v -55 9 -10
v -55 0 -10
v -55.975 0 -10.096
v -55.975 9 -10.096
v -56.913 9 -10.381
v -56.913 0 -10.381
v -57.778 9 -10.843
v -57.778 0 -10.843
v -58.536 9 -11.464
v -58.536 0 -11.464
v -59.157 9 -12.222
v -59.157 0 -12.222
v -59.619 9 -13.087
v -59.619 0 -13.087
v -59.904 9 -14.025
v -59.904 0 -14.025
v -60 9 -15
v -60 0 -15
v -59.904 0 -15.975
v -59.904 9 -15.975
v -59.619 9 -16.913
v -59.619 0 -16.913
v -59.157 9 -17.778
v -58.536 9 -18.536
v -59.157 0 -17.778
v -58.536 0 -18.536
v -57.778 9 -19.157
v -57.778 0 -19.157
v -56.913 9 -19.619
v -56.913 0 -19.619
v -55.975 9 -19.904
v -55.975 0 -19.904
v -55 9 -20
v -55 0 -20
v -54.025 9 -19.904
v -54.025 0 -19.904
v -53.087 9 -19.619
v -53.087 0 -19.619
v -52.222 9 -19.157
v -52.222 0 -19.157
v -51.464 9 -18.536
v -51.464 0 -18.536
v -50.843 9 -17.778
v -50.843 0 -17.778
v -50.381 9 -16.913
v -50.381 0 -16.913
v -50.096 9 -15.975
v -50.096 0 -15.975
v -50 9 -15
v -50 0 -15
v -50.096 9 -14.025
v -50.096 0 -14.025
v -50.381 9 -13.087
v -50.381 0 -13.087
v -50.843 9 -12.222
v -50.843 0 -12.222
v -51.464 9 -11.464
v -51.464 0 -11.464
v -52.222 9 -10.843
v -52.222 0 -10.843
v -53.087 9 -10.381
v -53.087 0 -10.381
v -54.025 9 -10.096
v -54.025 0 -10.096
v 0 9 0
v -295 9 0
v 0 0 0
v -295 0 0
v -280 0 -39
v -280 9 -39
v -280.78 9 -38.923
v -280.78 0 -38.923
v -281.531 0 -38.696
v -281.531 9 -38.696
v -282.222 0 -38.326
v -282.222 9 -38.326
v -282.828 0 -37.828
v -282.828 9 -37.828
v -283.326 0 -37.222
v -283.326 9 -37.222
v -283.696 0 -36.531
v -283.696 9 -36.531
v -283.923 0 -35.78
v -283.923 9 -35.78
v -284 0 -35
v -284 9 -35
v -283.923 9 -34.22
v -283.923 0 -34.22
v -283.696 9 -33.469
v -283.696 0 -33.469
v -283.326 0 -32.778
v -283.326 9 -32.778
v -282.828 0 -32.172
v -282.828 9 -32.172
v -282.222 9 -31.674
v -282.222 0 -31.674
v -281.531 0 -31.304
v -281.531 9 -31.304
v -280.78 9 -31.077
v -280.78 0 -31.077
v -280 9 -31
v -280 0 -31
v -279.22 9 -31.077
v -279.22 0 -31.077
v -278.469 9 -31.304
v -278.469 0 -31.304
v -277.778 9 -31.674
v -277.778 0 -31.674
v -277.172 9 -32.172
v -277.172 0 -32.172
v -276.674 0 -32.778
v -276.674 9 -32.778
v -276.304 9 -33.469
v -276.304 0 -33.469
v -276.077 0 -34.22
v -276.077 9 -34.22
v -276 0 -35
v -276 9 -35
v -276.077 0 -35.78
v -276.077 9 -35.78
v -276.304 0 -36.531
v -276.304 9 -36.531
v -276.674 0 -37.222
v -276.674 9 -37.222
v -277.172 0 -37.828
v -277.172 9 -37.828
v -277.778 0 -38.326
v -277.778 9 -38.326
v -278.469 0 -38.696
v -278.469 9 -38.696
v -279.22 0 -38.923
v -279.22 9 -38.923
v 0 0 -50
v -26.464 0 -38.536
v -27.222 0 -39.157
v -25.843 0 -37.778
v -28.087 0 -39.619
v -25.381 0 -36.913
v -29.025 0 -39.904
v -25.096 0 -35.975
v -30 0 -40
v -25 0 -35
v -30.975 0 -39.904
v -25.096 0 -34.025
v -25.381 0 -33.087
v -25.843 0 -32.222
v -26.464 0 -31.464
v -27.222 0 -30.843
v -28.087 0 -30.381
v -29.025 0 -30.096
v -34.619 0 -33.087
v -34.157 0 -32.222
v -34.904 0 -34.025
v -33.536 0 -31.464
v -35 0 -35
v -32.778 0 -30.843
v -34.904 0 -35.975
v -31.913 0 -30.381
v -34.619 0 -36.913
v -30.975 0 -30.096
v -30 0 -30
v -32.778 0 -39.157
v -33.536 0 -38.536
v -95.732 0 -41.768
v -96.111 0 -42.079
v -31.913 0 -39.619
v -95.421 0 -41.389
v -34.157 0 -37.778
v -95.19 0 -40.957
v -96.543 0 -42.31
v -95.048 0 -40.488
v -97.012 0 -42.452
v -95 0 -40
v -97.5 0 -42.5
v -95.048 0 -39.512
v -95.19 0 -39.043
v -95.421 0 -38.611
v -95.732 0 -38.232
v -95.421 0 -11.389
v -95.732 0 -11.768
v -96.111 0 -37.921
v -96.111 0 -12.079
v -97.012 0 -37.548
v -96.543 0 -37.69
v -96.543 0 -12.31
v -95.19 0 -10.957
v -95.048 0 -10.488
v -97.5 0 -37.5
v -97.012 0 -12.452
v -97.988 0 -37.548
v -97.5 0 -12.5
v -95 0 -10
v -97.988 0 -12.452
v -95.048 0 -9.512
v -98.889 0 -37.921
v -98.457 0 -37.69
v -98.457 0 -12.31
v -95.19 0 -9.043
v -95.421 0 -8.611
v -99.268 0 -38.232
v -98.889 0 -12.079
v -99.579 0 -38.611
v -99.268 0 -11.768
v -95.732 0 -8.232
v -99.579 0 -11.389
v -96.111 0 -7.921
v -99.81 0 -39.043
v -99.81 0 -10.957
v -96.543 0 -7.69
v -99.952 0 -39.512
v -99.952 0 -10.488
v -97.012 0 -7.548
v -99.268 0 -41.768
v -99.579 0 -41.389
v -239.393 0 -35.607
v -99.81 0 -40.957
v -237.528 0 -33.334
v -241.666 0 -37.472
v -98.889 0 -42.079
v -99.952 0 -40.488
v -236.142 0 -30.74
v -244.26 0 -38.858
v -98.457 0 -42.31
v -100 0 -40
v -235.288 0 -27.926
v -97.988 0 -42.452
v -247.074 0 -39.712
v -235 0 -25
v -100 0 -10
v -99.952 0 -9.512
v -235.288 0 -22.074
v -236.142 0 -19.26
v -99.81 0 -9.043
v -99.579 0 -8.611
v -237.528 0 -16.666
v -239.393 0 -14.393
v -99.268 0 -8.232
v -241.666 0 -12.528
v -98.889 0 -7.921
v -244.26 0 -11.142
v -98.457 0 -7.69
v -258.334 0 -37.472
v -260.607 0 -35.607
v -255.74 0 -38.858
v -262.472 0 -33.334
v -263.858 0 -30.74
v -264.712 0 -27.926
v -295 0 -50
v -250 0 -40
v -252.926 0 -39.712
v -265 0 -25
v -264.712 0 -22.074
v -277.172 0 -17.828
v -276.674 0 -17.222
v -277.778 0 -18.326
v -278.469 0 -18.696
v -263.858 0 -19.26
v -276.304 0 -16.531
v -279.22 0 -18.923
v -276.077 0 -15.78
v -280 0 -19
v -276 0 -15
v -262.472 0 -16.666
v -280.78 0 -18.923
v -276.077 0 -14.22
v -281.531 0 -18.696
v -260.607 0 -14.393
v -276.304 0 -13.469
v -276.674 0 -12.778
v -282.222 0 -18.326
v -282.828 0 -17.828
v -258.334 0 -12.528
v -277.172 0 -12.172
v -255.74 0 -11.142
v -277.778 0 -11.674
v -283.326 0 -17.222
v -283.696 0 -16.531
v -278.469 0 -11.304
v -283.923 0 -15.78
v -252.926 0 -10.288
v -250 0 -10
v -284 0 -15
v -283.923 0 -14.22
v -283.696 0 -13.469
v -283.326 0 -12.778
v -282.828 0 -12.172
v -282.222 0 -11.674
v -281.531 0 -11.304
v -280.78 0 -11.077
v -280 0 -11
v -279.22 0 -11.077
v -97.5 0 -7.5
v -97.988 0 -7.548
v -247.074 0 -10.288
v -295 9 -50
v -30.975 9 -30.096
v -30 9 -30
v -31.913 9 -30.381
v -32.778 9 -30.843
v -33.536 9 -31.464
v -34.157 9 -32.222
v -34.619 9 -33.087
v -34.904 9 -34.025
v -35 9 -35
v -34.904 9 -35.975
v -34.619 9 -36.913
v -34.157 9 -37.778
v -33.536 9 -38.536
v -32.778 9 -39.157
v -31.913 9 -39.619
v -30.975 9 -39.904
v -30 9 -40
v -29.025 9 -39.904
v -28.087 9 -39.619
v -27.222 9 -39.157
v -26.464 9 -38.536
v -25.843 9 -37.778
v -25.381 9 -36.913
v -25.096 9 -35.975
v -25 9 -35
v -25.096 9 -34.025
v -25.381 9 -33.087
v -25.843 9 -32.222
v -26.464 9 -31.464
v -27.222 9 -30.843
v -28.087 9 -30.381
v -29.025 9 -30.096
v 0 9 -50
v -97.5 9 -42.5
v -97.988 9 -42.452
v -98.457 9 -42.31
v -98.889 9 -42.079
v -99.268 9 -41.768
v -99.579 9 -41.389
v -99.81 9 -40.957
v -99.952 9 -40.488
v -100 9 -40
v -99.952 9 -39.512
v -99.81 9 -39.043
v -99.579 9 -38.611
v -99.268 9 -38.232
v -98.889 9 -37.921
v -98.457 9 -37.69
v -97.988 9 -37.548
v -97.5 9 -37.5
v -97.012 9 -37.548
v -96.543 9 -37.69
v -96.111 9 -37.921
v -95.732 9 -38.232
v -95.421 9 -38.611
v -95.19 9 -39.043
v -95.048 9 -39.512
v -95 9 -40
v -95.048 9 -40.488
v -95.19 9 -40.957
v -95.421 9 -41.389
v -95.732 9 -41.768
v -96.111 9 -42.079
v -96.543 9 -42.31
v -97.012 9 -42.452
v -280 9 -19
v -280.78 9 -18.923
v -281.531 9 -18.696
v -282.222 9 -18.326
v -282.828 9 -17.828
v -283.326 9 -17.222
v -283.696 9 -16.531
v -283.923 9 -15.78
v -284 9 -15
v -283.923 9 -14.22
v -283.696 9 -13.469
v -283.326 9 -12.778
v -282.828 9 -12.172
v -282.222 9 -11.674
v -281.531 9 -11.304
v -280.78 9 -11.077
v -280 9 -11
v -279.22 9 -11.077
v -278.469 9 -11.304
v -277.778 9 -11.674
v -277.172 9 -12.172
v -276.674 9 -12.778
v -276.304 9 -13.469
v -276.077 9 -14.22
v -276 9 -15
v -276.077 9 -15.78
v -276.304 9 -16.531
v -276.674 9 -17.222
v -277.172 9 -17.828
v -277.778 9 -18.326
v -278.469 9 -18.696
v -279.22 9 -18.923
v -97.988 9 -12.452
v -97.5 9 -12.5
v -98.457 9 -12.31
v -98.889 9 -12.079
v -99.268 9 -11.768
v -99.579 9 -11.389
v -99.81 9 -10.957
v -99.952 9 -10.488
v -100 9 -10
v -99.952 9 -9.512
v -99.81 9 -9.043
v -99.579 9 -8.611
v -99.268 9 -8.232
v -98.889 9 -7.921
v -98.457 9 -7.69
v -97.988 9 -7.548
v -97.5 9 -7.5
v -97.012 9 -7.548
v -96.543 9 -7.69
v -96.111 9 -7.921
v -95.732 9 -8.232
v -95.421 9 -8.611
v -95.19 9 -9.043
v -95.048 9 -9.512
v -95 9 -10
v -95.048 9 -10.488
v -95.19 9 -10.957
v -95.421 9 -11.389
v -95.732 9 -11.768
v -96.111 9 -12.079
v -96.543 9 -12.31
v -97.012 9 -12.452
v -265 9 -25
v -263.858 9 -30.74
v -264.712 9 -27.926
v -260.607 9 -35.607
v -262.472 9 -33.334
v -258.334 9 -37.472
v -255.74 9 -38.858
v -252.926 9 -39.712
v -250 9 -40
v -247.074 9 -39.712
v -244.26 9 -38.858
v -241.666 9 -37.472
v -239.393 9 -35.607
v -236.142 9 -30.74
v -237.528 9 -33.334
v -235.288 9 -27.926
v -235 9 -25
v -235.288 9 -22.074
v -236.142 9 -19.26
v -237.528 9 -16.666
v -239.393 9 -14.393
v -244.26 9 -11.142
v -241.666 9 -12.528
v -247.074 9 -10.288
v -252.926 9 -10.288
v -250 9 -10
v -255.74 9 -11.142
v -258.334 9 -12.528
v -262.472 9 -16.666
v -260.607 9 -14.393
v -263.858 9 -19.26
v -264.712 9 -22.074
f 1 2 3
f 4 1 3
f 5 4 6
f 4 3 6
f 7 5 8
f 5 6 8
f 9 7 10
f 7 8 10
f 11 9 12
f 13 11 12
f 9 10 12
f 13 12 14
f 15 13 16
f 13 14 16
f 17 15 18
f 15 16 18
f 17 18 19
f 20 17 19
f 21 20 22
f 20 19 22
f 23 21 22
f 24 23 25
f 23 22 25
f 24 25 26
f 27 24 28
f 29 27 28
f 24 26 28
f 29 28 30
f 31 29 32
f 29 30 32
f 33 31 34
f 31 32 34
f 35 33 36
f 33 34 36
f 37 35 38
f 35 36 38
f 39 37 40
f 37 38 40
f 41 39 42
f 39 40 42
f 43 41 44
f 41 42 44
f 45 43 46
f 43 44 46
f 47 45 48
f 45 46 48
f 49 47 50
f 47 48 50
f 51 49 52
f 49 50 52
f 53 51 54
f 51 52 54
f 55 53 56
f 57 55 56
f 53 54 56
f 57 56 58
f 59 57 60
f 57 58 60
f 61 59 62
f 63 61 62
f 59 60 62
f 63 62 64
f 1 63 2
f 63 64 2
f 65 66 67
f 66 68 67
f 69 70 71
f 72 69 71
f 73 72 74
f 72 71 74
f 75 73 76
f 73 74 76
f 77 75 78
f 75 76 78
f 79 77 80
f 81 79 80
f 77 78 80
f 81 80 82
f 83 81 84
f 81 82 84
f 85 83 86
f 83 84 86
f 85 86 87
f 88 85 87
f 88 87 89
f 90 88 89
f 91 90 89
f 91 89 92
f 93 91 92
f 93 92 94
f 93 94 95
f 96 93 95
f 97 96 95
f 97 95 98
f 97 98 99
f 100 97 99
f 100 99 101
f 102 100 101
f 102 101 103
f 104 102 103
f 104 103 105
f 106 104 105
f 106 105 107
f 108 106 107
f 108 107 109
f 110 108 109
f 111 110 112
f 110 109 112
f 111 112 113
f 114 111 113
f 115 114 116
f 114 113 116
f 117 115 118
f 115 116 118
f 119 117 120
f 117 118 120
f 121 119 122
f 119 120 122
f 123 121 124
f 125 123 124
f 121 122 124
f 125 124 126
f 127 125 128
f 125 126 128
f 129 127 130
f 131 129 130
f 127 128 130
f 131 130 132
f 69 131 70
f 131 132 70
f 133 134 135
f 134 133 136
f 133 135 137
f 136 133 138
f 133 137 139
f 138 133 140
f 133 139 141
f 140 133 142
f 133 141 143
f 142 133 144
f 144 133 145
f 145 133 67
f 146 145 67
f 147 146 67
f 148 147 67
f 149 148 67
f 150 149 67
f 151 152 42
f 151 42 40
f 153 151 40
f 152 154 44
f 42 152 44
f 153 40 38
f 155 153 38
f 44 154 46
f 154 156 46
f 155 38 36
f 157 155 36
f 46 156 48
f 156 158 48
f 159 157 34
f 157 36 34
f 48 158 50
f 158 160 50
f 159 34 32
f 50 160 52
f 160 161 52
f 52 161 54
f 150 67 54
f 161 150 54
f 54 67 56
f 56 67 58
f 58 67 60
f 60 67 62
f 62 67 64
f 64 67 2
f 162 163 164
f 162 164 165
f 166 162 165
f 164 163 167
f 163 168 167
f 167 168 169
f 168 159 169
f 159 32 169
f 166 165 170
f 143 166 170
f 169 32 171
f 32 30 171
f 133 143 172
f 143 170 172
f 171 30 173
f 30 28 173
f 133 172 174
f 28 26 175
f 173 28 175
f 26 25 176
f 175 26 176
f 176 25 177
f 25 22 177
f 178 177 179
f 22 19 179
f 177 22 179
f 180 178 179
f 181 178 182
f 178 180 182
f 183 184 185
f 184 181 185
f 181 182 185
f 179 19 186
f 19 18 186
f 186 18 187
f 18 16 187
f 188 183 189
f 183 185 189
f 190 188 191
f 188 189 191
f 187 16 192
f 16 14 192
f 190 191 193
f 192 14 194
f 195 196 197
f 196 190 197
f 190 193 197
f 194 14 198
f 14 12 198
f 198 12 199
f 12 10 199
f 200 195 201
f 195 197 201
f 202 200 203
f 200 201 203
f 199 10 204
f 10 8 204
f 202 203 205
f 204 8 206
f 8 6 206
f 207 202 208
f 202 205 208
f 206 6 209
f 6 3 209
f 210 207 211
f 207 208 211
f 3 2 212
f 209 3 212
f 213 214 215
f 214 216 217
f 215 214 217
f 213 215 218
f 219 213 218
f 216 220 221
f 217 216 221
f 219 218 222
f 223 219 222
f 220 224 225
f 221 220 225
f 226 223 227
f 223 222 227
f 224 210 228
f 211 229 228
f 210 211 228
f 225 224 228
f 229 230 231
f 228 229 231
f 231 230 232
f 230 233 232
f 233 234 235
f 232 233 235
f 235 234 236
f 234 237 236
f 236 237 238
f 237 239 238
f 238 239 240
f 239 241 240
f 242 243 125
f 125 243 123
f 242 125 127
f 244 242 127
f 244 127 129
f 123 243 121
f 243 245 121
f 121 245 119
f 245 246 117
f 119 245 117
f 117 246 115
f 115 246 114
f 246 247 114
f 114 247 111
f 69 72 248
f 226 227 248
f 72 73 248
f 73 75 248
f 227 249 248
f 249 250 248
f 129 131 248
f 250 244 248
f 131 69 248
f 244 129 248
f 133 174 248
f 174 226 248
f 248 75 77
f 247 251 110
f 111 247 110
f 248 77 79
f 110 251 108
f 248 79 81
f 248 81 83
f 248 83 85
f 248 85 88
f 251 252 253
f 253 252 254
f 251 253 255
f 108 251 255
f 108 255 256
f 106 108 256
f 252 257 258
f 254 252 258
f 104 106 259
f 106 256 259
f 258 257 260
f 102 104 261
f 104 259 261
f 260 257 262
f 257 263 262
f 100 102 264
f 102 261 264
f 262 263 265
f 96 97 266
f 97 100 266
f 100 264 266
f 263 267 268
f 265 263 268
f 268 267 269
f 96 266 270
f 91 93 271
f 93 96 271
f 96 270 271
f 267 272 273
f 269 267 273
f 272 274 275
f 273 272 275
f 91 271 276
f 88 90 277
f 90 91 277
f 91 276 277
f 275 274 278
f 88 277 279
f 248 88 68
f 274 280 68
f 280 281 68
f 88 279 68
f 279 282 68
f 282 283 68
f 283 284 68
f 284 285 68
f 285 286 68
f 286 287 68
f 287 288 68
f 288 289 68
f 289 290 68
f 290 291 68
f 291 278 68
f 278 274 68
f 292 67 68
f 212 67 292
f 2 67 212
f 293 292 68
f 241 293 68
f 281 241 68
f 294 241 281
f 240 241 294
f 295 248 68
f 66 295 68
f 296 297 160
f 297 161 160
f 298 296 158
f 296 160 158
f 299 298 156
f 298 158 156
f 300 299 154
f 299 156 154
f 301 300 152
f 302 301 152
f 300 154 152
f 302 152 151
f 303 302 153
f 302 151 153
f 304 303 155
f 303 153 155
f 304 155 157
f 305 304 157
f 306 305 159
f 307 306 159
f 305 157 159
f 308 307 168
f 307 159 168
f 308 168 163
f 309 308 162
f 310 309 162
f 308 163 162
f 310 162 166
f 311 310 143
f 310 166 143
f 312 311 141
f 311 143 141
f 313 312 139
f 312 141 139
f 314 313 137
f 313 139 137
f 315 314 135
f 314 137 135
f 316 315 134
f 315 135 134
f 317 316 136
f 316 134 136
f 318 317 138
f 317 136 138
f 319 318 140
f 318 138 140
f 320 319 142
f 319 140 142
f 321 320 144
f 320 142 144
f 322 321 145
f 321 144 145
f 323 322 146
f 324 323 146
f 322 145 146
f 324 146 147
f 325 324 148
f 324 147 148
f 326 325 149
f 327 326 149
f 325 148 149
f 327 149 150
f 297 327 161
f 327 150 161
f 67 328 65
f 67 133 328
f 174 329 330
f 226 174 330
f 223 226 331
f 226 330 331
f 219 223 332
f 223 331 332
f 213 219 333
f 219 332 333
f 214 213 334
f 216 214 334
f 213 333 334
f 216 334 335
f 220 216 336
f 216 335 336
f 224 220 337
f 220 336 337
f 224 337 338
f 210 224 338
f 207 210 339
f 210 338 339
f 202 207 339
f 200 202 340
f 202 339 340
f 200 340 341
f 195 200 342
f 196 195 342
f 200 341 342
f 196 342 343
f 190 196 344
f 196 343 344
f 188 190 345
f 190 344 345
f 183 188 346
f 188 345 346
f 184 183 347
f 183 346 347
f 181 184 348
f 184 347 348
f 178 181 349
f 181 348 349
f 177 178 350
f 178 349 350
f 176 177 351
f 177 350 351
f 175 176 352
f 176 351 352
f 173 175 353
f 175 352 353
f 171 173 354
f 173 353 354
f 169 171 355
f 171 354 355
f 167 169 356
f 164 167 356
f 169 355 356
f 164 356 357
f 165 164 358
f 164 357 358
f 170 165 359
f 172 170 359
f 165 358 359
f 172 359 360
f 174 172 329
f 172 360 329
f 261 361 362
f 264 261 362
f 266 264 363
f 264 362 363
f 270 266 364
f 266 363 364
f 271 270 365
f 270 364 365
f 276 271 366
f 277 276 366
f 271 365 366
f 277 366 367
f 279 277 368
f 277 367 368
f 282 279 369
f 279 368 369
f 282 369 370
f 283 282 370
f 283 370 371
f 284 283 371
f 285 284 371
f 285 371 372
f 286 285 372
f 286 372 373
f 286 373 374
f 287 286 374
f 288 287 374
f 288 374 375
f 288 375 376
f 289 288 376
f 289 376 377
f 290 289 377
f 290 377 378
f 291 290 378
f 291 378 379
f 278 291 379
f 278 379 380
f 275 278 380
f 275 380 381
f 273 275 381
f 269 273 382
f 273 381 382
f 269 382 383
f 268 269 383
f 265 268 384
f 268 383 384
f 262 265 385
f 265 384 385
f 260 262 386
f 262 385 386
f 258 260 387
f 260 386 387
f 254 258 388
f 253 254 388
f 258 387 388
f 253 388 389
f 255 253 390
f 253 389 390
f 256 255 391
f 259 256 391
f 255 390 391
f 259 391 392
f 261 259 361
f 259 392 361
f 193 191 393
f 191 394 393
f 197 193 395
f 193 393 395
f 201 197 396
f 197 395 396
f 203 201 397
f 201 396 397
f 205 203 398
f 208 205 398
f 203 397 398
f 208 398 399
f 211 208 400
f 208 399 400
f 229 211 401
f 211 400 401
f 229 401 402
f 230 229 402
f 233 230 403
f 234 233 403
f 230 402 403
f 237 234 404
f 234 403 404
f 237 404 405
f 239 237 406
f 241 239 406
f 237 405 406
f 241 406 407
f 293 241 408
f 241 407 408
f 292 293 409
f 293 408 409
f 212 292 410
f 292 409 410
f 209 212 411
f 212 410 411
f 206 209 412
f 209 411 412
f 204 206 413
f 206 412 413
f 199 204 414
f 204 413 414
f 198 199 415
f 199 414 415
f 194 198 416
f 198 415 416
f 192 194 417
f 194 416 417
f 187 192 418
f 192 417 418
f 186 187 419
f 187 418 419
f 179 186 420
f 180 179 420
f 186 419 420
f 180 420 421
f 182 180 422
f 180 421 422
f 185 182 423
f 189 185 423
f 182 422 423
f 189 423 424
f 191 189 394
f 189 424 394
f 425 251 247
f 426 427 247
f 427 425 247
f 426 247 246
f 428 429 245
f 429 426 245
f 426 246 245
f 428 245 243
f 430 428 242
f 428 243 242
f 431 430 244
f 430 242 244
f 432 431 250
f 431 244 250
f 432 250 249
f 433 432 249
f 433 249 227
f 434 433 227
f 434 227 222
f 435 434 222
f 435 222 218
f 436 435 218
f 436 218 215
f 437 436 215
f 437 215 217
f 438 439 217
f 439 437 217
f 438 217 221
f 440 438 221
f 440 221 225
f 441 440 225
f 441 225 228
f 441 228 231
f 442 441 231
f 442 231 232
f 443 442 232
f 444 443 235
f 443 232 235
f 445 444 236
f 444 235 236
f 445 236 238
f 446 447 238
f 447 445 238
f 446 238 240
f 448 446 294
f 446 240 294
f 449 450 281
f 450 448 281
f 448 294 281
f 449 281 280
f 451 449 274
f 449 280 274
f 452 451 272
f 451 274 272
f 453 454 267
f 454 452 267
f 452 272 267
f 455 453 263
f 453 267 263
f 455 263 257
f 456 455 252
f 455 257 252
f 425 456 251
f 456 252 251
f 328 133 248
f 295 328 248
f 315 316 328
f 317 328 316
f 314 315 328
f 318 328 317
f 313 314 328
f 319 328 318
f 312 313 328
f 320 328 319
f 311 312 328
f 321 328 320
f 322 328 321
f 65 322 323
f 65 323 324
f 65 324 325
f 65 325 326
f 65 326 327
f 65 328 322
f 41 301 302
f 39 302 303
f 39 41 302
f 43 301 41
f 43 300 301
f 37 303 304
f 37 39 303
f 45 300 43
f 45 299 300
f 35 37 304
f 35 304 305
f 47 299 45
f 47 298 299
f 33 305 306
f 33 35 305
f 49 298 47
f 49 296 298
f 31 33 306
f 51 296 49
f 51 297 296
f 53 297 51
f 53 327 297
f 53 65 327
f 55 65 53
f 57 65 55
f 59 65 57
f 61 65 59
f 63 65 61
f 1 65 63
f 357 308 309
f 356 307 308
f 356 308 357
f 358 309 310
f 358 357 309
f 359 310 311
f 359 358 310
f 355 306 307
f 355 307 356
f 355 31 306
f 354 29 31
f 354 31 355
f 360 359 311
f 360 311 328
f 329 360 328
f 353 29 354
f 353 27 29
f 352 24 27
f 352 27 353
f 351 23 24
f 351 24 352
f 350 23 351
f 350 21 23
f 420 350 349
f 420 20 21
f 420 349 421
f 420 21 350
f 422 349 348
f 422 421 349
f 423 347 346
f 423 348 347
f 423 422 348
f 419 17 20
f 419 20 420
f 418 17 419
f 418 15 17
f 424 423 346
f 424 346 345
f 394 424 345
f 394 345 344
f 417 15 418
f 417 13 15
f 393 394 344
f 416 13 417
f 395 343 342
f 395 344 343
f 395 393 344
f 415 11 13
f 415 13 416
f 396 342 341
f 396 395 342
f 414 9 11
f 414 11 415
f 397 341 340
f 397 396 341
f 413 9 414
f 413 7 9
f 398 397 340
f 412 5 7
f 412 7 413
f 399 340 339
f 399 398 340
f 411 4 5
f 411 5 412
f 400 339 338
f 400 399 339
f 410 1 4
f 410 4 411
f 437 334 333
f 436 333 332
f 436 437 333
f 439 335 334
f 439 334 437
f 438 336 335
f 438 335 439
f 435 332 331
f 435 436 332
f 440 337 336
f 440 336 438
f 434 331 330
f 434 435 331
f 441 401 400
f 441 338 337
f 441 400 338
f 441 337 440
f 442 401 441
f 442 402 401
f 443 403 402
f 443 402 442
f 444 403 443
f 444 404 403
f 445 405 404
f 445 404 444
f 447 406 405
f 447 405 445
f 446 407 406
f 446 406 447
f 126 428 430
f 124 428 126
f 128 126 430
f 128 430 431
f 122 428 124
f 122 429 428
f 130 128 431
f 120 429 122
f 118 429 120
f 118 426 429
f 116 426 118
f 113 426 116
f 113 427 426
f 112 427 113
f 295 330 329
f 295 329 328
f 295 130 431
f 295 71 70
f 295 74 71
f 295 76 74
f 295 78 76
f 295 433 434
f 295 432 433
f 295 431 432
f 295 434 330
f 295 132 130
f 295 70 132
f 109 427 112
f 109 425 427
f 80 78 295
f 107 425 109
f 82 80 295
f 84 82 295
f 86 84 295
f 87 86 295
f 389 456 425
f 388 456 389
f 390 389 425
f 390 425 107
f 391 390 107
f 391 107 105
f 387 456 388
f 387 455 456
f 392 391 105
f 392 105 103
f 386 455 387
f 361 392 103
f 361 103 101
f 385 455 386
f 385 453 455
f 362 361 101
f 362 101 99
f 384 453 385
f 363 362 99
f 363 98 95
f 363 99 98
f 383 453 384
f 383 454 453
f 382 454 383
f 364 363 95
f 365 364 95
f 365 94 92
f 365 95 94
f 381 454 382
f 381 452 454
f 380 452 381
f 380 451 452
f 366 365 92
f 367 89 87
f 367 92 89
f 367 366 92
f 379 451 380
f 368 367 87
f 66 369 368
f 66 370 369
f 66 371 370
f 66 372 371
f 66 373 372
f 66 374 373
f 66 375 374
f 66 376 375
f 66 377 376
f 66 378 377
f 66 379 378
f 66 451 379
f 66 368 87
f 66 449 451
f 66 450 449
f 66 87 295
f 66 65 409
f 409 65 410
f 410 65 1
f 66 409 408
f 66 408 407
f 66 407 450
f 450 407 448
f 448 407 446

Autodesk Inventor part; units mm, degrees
ref_plane "YZ Plane" through (0, 0, 0) normal (1, 0, 0) x (0, 1, 0)
ref_plane "XZ Plane" through (0, 0, 0) normal (0, 1, 0) x (-1, 0, 0)
ref_plane "XY Plane" through (0, 0, 0) normal (0, 0, 1) x (1, 0, 0)
sketch "Skizze1" plane through (0, 0, 0) normal (0, 1, 0) x (-1, 0, 0)
  line L0 (0, 0) -> (275, 0)
  line L1 (275, 0) -> (275, -50)
  line L2 (275, -50) -> (0, -50)
  line L3 (0, -50) -> (0, 0)
  line L4 (275, 0) -> (275, -25)
  line L5 (275, -25) -> (250, -25)
  circle A0 centre (250, -25) radius 15
  line L6 (275, -50) -> (295, -50)
  line L7 (295, -50) -> (295, 0)
  line L8 (295, 0) -> (275, 0)
  dimension "d0" = 275
  dimension "d1" = 50
  dimension "d2" = 25
  dimension "d3" = 30
  dimension "d18" = 20
extrude "Extrusion1" add sketch "Skizze1" along normal blind 9 contours L0 L1 L2 L3
sketch "Skizze2" plane through (0, 9, 0) normal (0, 1, 0) x (1, 0, 0)
  line L0 (0, 0) -> (0, 50) projected
  line L1 (0, 50) -> (-30, 50)
  line L2 (-30, 50) -> (-30, 35)
  line L3 (0, 0) -> (-55, 0)
  line L4 (-275, 0) -> (0, 0) projected
  line L5 (-55, 0) -> (-70, 0)
  line L6 (-70, 0) -> (-55, 0)
  line L7 (-55, 0) -> (-55, 15)
  dimension "d6" = 30
  dimension "d7" = 15
  dimension "d8" = 55
  dimension "d9" = 15
  dimension "d10" = 15
hole "Bohrung1" at (-55, 9, -15) at (-30, 9, -35) direction (0, -1, 0) diameter 10 depth 10 tip angle 118
extrude "Extrusion2" add sketch "Skizze1" along normal blind 9 contours L8 L7 L6 L1
sketch "Skizze3" plane through (0, 0, 0) normal (0, -1, 0) x (1, 0, 0)
  line L0 (0, -50) -> (-295, -50) projected
  line L1 (-295, -50) -> (-280, -50)
  line L2 (-280, -50) -> (-280, -35)
  line L3 (-280, -35) -> (-280, -15)
  line L4 (-280, -15) -> (-280, 0)
  line L5 (-295, 0) -> (0, 0) projected
  dimension "d21" = 15
  dimension "d22" = 15
  dimension "d23" = 20
hole "Bohrung2" at (-280, 0, -15) at (-280, 0, -35) direction (0, 1, 0) diameter 8 depth 9 tip angle 118
sketch "Skizze4" plane through (0, 0, 0) normal (0, -1, 0) x (1, 0, 0)
  line L0 (-97.5, -25) -> (-97.5, 0)
  line L1 (-97.5, 0) -> (-97.5, -10)
  line L2 (-97.5, -10) -> (-97.5, -40)
  line L3 (0, 0) -> (0, -50) projected
  point P0 (-250, -25)
  point P1 (-223.5, -37.5)
  point P2 (-223.5, -12.5)
  point P3 (-138.5, -37.5)
  point P4 (-138.5, -12.5)
  dimension "d45" = 10
  dimension "d46" = 30
  dimension "d47" = 97.5
hole "Bohrung3" at (-97.5, 0, -40) at (-97.5, 0, -10) direction (0, 1, 0) diameter 5 end through all
properties part number "Lagerstuetze_Sensor" material "Holz (Birke)"
